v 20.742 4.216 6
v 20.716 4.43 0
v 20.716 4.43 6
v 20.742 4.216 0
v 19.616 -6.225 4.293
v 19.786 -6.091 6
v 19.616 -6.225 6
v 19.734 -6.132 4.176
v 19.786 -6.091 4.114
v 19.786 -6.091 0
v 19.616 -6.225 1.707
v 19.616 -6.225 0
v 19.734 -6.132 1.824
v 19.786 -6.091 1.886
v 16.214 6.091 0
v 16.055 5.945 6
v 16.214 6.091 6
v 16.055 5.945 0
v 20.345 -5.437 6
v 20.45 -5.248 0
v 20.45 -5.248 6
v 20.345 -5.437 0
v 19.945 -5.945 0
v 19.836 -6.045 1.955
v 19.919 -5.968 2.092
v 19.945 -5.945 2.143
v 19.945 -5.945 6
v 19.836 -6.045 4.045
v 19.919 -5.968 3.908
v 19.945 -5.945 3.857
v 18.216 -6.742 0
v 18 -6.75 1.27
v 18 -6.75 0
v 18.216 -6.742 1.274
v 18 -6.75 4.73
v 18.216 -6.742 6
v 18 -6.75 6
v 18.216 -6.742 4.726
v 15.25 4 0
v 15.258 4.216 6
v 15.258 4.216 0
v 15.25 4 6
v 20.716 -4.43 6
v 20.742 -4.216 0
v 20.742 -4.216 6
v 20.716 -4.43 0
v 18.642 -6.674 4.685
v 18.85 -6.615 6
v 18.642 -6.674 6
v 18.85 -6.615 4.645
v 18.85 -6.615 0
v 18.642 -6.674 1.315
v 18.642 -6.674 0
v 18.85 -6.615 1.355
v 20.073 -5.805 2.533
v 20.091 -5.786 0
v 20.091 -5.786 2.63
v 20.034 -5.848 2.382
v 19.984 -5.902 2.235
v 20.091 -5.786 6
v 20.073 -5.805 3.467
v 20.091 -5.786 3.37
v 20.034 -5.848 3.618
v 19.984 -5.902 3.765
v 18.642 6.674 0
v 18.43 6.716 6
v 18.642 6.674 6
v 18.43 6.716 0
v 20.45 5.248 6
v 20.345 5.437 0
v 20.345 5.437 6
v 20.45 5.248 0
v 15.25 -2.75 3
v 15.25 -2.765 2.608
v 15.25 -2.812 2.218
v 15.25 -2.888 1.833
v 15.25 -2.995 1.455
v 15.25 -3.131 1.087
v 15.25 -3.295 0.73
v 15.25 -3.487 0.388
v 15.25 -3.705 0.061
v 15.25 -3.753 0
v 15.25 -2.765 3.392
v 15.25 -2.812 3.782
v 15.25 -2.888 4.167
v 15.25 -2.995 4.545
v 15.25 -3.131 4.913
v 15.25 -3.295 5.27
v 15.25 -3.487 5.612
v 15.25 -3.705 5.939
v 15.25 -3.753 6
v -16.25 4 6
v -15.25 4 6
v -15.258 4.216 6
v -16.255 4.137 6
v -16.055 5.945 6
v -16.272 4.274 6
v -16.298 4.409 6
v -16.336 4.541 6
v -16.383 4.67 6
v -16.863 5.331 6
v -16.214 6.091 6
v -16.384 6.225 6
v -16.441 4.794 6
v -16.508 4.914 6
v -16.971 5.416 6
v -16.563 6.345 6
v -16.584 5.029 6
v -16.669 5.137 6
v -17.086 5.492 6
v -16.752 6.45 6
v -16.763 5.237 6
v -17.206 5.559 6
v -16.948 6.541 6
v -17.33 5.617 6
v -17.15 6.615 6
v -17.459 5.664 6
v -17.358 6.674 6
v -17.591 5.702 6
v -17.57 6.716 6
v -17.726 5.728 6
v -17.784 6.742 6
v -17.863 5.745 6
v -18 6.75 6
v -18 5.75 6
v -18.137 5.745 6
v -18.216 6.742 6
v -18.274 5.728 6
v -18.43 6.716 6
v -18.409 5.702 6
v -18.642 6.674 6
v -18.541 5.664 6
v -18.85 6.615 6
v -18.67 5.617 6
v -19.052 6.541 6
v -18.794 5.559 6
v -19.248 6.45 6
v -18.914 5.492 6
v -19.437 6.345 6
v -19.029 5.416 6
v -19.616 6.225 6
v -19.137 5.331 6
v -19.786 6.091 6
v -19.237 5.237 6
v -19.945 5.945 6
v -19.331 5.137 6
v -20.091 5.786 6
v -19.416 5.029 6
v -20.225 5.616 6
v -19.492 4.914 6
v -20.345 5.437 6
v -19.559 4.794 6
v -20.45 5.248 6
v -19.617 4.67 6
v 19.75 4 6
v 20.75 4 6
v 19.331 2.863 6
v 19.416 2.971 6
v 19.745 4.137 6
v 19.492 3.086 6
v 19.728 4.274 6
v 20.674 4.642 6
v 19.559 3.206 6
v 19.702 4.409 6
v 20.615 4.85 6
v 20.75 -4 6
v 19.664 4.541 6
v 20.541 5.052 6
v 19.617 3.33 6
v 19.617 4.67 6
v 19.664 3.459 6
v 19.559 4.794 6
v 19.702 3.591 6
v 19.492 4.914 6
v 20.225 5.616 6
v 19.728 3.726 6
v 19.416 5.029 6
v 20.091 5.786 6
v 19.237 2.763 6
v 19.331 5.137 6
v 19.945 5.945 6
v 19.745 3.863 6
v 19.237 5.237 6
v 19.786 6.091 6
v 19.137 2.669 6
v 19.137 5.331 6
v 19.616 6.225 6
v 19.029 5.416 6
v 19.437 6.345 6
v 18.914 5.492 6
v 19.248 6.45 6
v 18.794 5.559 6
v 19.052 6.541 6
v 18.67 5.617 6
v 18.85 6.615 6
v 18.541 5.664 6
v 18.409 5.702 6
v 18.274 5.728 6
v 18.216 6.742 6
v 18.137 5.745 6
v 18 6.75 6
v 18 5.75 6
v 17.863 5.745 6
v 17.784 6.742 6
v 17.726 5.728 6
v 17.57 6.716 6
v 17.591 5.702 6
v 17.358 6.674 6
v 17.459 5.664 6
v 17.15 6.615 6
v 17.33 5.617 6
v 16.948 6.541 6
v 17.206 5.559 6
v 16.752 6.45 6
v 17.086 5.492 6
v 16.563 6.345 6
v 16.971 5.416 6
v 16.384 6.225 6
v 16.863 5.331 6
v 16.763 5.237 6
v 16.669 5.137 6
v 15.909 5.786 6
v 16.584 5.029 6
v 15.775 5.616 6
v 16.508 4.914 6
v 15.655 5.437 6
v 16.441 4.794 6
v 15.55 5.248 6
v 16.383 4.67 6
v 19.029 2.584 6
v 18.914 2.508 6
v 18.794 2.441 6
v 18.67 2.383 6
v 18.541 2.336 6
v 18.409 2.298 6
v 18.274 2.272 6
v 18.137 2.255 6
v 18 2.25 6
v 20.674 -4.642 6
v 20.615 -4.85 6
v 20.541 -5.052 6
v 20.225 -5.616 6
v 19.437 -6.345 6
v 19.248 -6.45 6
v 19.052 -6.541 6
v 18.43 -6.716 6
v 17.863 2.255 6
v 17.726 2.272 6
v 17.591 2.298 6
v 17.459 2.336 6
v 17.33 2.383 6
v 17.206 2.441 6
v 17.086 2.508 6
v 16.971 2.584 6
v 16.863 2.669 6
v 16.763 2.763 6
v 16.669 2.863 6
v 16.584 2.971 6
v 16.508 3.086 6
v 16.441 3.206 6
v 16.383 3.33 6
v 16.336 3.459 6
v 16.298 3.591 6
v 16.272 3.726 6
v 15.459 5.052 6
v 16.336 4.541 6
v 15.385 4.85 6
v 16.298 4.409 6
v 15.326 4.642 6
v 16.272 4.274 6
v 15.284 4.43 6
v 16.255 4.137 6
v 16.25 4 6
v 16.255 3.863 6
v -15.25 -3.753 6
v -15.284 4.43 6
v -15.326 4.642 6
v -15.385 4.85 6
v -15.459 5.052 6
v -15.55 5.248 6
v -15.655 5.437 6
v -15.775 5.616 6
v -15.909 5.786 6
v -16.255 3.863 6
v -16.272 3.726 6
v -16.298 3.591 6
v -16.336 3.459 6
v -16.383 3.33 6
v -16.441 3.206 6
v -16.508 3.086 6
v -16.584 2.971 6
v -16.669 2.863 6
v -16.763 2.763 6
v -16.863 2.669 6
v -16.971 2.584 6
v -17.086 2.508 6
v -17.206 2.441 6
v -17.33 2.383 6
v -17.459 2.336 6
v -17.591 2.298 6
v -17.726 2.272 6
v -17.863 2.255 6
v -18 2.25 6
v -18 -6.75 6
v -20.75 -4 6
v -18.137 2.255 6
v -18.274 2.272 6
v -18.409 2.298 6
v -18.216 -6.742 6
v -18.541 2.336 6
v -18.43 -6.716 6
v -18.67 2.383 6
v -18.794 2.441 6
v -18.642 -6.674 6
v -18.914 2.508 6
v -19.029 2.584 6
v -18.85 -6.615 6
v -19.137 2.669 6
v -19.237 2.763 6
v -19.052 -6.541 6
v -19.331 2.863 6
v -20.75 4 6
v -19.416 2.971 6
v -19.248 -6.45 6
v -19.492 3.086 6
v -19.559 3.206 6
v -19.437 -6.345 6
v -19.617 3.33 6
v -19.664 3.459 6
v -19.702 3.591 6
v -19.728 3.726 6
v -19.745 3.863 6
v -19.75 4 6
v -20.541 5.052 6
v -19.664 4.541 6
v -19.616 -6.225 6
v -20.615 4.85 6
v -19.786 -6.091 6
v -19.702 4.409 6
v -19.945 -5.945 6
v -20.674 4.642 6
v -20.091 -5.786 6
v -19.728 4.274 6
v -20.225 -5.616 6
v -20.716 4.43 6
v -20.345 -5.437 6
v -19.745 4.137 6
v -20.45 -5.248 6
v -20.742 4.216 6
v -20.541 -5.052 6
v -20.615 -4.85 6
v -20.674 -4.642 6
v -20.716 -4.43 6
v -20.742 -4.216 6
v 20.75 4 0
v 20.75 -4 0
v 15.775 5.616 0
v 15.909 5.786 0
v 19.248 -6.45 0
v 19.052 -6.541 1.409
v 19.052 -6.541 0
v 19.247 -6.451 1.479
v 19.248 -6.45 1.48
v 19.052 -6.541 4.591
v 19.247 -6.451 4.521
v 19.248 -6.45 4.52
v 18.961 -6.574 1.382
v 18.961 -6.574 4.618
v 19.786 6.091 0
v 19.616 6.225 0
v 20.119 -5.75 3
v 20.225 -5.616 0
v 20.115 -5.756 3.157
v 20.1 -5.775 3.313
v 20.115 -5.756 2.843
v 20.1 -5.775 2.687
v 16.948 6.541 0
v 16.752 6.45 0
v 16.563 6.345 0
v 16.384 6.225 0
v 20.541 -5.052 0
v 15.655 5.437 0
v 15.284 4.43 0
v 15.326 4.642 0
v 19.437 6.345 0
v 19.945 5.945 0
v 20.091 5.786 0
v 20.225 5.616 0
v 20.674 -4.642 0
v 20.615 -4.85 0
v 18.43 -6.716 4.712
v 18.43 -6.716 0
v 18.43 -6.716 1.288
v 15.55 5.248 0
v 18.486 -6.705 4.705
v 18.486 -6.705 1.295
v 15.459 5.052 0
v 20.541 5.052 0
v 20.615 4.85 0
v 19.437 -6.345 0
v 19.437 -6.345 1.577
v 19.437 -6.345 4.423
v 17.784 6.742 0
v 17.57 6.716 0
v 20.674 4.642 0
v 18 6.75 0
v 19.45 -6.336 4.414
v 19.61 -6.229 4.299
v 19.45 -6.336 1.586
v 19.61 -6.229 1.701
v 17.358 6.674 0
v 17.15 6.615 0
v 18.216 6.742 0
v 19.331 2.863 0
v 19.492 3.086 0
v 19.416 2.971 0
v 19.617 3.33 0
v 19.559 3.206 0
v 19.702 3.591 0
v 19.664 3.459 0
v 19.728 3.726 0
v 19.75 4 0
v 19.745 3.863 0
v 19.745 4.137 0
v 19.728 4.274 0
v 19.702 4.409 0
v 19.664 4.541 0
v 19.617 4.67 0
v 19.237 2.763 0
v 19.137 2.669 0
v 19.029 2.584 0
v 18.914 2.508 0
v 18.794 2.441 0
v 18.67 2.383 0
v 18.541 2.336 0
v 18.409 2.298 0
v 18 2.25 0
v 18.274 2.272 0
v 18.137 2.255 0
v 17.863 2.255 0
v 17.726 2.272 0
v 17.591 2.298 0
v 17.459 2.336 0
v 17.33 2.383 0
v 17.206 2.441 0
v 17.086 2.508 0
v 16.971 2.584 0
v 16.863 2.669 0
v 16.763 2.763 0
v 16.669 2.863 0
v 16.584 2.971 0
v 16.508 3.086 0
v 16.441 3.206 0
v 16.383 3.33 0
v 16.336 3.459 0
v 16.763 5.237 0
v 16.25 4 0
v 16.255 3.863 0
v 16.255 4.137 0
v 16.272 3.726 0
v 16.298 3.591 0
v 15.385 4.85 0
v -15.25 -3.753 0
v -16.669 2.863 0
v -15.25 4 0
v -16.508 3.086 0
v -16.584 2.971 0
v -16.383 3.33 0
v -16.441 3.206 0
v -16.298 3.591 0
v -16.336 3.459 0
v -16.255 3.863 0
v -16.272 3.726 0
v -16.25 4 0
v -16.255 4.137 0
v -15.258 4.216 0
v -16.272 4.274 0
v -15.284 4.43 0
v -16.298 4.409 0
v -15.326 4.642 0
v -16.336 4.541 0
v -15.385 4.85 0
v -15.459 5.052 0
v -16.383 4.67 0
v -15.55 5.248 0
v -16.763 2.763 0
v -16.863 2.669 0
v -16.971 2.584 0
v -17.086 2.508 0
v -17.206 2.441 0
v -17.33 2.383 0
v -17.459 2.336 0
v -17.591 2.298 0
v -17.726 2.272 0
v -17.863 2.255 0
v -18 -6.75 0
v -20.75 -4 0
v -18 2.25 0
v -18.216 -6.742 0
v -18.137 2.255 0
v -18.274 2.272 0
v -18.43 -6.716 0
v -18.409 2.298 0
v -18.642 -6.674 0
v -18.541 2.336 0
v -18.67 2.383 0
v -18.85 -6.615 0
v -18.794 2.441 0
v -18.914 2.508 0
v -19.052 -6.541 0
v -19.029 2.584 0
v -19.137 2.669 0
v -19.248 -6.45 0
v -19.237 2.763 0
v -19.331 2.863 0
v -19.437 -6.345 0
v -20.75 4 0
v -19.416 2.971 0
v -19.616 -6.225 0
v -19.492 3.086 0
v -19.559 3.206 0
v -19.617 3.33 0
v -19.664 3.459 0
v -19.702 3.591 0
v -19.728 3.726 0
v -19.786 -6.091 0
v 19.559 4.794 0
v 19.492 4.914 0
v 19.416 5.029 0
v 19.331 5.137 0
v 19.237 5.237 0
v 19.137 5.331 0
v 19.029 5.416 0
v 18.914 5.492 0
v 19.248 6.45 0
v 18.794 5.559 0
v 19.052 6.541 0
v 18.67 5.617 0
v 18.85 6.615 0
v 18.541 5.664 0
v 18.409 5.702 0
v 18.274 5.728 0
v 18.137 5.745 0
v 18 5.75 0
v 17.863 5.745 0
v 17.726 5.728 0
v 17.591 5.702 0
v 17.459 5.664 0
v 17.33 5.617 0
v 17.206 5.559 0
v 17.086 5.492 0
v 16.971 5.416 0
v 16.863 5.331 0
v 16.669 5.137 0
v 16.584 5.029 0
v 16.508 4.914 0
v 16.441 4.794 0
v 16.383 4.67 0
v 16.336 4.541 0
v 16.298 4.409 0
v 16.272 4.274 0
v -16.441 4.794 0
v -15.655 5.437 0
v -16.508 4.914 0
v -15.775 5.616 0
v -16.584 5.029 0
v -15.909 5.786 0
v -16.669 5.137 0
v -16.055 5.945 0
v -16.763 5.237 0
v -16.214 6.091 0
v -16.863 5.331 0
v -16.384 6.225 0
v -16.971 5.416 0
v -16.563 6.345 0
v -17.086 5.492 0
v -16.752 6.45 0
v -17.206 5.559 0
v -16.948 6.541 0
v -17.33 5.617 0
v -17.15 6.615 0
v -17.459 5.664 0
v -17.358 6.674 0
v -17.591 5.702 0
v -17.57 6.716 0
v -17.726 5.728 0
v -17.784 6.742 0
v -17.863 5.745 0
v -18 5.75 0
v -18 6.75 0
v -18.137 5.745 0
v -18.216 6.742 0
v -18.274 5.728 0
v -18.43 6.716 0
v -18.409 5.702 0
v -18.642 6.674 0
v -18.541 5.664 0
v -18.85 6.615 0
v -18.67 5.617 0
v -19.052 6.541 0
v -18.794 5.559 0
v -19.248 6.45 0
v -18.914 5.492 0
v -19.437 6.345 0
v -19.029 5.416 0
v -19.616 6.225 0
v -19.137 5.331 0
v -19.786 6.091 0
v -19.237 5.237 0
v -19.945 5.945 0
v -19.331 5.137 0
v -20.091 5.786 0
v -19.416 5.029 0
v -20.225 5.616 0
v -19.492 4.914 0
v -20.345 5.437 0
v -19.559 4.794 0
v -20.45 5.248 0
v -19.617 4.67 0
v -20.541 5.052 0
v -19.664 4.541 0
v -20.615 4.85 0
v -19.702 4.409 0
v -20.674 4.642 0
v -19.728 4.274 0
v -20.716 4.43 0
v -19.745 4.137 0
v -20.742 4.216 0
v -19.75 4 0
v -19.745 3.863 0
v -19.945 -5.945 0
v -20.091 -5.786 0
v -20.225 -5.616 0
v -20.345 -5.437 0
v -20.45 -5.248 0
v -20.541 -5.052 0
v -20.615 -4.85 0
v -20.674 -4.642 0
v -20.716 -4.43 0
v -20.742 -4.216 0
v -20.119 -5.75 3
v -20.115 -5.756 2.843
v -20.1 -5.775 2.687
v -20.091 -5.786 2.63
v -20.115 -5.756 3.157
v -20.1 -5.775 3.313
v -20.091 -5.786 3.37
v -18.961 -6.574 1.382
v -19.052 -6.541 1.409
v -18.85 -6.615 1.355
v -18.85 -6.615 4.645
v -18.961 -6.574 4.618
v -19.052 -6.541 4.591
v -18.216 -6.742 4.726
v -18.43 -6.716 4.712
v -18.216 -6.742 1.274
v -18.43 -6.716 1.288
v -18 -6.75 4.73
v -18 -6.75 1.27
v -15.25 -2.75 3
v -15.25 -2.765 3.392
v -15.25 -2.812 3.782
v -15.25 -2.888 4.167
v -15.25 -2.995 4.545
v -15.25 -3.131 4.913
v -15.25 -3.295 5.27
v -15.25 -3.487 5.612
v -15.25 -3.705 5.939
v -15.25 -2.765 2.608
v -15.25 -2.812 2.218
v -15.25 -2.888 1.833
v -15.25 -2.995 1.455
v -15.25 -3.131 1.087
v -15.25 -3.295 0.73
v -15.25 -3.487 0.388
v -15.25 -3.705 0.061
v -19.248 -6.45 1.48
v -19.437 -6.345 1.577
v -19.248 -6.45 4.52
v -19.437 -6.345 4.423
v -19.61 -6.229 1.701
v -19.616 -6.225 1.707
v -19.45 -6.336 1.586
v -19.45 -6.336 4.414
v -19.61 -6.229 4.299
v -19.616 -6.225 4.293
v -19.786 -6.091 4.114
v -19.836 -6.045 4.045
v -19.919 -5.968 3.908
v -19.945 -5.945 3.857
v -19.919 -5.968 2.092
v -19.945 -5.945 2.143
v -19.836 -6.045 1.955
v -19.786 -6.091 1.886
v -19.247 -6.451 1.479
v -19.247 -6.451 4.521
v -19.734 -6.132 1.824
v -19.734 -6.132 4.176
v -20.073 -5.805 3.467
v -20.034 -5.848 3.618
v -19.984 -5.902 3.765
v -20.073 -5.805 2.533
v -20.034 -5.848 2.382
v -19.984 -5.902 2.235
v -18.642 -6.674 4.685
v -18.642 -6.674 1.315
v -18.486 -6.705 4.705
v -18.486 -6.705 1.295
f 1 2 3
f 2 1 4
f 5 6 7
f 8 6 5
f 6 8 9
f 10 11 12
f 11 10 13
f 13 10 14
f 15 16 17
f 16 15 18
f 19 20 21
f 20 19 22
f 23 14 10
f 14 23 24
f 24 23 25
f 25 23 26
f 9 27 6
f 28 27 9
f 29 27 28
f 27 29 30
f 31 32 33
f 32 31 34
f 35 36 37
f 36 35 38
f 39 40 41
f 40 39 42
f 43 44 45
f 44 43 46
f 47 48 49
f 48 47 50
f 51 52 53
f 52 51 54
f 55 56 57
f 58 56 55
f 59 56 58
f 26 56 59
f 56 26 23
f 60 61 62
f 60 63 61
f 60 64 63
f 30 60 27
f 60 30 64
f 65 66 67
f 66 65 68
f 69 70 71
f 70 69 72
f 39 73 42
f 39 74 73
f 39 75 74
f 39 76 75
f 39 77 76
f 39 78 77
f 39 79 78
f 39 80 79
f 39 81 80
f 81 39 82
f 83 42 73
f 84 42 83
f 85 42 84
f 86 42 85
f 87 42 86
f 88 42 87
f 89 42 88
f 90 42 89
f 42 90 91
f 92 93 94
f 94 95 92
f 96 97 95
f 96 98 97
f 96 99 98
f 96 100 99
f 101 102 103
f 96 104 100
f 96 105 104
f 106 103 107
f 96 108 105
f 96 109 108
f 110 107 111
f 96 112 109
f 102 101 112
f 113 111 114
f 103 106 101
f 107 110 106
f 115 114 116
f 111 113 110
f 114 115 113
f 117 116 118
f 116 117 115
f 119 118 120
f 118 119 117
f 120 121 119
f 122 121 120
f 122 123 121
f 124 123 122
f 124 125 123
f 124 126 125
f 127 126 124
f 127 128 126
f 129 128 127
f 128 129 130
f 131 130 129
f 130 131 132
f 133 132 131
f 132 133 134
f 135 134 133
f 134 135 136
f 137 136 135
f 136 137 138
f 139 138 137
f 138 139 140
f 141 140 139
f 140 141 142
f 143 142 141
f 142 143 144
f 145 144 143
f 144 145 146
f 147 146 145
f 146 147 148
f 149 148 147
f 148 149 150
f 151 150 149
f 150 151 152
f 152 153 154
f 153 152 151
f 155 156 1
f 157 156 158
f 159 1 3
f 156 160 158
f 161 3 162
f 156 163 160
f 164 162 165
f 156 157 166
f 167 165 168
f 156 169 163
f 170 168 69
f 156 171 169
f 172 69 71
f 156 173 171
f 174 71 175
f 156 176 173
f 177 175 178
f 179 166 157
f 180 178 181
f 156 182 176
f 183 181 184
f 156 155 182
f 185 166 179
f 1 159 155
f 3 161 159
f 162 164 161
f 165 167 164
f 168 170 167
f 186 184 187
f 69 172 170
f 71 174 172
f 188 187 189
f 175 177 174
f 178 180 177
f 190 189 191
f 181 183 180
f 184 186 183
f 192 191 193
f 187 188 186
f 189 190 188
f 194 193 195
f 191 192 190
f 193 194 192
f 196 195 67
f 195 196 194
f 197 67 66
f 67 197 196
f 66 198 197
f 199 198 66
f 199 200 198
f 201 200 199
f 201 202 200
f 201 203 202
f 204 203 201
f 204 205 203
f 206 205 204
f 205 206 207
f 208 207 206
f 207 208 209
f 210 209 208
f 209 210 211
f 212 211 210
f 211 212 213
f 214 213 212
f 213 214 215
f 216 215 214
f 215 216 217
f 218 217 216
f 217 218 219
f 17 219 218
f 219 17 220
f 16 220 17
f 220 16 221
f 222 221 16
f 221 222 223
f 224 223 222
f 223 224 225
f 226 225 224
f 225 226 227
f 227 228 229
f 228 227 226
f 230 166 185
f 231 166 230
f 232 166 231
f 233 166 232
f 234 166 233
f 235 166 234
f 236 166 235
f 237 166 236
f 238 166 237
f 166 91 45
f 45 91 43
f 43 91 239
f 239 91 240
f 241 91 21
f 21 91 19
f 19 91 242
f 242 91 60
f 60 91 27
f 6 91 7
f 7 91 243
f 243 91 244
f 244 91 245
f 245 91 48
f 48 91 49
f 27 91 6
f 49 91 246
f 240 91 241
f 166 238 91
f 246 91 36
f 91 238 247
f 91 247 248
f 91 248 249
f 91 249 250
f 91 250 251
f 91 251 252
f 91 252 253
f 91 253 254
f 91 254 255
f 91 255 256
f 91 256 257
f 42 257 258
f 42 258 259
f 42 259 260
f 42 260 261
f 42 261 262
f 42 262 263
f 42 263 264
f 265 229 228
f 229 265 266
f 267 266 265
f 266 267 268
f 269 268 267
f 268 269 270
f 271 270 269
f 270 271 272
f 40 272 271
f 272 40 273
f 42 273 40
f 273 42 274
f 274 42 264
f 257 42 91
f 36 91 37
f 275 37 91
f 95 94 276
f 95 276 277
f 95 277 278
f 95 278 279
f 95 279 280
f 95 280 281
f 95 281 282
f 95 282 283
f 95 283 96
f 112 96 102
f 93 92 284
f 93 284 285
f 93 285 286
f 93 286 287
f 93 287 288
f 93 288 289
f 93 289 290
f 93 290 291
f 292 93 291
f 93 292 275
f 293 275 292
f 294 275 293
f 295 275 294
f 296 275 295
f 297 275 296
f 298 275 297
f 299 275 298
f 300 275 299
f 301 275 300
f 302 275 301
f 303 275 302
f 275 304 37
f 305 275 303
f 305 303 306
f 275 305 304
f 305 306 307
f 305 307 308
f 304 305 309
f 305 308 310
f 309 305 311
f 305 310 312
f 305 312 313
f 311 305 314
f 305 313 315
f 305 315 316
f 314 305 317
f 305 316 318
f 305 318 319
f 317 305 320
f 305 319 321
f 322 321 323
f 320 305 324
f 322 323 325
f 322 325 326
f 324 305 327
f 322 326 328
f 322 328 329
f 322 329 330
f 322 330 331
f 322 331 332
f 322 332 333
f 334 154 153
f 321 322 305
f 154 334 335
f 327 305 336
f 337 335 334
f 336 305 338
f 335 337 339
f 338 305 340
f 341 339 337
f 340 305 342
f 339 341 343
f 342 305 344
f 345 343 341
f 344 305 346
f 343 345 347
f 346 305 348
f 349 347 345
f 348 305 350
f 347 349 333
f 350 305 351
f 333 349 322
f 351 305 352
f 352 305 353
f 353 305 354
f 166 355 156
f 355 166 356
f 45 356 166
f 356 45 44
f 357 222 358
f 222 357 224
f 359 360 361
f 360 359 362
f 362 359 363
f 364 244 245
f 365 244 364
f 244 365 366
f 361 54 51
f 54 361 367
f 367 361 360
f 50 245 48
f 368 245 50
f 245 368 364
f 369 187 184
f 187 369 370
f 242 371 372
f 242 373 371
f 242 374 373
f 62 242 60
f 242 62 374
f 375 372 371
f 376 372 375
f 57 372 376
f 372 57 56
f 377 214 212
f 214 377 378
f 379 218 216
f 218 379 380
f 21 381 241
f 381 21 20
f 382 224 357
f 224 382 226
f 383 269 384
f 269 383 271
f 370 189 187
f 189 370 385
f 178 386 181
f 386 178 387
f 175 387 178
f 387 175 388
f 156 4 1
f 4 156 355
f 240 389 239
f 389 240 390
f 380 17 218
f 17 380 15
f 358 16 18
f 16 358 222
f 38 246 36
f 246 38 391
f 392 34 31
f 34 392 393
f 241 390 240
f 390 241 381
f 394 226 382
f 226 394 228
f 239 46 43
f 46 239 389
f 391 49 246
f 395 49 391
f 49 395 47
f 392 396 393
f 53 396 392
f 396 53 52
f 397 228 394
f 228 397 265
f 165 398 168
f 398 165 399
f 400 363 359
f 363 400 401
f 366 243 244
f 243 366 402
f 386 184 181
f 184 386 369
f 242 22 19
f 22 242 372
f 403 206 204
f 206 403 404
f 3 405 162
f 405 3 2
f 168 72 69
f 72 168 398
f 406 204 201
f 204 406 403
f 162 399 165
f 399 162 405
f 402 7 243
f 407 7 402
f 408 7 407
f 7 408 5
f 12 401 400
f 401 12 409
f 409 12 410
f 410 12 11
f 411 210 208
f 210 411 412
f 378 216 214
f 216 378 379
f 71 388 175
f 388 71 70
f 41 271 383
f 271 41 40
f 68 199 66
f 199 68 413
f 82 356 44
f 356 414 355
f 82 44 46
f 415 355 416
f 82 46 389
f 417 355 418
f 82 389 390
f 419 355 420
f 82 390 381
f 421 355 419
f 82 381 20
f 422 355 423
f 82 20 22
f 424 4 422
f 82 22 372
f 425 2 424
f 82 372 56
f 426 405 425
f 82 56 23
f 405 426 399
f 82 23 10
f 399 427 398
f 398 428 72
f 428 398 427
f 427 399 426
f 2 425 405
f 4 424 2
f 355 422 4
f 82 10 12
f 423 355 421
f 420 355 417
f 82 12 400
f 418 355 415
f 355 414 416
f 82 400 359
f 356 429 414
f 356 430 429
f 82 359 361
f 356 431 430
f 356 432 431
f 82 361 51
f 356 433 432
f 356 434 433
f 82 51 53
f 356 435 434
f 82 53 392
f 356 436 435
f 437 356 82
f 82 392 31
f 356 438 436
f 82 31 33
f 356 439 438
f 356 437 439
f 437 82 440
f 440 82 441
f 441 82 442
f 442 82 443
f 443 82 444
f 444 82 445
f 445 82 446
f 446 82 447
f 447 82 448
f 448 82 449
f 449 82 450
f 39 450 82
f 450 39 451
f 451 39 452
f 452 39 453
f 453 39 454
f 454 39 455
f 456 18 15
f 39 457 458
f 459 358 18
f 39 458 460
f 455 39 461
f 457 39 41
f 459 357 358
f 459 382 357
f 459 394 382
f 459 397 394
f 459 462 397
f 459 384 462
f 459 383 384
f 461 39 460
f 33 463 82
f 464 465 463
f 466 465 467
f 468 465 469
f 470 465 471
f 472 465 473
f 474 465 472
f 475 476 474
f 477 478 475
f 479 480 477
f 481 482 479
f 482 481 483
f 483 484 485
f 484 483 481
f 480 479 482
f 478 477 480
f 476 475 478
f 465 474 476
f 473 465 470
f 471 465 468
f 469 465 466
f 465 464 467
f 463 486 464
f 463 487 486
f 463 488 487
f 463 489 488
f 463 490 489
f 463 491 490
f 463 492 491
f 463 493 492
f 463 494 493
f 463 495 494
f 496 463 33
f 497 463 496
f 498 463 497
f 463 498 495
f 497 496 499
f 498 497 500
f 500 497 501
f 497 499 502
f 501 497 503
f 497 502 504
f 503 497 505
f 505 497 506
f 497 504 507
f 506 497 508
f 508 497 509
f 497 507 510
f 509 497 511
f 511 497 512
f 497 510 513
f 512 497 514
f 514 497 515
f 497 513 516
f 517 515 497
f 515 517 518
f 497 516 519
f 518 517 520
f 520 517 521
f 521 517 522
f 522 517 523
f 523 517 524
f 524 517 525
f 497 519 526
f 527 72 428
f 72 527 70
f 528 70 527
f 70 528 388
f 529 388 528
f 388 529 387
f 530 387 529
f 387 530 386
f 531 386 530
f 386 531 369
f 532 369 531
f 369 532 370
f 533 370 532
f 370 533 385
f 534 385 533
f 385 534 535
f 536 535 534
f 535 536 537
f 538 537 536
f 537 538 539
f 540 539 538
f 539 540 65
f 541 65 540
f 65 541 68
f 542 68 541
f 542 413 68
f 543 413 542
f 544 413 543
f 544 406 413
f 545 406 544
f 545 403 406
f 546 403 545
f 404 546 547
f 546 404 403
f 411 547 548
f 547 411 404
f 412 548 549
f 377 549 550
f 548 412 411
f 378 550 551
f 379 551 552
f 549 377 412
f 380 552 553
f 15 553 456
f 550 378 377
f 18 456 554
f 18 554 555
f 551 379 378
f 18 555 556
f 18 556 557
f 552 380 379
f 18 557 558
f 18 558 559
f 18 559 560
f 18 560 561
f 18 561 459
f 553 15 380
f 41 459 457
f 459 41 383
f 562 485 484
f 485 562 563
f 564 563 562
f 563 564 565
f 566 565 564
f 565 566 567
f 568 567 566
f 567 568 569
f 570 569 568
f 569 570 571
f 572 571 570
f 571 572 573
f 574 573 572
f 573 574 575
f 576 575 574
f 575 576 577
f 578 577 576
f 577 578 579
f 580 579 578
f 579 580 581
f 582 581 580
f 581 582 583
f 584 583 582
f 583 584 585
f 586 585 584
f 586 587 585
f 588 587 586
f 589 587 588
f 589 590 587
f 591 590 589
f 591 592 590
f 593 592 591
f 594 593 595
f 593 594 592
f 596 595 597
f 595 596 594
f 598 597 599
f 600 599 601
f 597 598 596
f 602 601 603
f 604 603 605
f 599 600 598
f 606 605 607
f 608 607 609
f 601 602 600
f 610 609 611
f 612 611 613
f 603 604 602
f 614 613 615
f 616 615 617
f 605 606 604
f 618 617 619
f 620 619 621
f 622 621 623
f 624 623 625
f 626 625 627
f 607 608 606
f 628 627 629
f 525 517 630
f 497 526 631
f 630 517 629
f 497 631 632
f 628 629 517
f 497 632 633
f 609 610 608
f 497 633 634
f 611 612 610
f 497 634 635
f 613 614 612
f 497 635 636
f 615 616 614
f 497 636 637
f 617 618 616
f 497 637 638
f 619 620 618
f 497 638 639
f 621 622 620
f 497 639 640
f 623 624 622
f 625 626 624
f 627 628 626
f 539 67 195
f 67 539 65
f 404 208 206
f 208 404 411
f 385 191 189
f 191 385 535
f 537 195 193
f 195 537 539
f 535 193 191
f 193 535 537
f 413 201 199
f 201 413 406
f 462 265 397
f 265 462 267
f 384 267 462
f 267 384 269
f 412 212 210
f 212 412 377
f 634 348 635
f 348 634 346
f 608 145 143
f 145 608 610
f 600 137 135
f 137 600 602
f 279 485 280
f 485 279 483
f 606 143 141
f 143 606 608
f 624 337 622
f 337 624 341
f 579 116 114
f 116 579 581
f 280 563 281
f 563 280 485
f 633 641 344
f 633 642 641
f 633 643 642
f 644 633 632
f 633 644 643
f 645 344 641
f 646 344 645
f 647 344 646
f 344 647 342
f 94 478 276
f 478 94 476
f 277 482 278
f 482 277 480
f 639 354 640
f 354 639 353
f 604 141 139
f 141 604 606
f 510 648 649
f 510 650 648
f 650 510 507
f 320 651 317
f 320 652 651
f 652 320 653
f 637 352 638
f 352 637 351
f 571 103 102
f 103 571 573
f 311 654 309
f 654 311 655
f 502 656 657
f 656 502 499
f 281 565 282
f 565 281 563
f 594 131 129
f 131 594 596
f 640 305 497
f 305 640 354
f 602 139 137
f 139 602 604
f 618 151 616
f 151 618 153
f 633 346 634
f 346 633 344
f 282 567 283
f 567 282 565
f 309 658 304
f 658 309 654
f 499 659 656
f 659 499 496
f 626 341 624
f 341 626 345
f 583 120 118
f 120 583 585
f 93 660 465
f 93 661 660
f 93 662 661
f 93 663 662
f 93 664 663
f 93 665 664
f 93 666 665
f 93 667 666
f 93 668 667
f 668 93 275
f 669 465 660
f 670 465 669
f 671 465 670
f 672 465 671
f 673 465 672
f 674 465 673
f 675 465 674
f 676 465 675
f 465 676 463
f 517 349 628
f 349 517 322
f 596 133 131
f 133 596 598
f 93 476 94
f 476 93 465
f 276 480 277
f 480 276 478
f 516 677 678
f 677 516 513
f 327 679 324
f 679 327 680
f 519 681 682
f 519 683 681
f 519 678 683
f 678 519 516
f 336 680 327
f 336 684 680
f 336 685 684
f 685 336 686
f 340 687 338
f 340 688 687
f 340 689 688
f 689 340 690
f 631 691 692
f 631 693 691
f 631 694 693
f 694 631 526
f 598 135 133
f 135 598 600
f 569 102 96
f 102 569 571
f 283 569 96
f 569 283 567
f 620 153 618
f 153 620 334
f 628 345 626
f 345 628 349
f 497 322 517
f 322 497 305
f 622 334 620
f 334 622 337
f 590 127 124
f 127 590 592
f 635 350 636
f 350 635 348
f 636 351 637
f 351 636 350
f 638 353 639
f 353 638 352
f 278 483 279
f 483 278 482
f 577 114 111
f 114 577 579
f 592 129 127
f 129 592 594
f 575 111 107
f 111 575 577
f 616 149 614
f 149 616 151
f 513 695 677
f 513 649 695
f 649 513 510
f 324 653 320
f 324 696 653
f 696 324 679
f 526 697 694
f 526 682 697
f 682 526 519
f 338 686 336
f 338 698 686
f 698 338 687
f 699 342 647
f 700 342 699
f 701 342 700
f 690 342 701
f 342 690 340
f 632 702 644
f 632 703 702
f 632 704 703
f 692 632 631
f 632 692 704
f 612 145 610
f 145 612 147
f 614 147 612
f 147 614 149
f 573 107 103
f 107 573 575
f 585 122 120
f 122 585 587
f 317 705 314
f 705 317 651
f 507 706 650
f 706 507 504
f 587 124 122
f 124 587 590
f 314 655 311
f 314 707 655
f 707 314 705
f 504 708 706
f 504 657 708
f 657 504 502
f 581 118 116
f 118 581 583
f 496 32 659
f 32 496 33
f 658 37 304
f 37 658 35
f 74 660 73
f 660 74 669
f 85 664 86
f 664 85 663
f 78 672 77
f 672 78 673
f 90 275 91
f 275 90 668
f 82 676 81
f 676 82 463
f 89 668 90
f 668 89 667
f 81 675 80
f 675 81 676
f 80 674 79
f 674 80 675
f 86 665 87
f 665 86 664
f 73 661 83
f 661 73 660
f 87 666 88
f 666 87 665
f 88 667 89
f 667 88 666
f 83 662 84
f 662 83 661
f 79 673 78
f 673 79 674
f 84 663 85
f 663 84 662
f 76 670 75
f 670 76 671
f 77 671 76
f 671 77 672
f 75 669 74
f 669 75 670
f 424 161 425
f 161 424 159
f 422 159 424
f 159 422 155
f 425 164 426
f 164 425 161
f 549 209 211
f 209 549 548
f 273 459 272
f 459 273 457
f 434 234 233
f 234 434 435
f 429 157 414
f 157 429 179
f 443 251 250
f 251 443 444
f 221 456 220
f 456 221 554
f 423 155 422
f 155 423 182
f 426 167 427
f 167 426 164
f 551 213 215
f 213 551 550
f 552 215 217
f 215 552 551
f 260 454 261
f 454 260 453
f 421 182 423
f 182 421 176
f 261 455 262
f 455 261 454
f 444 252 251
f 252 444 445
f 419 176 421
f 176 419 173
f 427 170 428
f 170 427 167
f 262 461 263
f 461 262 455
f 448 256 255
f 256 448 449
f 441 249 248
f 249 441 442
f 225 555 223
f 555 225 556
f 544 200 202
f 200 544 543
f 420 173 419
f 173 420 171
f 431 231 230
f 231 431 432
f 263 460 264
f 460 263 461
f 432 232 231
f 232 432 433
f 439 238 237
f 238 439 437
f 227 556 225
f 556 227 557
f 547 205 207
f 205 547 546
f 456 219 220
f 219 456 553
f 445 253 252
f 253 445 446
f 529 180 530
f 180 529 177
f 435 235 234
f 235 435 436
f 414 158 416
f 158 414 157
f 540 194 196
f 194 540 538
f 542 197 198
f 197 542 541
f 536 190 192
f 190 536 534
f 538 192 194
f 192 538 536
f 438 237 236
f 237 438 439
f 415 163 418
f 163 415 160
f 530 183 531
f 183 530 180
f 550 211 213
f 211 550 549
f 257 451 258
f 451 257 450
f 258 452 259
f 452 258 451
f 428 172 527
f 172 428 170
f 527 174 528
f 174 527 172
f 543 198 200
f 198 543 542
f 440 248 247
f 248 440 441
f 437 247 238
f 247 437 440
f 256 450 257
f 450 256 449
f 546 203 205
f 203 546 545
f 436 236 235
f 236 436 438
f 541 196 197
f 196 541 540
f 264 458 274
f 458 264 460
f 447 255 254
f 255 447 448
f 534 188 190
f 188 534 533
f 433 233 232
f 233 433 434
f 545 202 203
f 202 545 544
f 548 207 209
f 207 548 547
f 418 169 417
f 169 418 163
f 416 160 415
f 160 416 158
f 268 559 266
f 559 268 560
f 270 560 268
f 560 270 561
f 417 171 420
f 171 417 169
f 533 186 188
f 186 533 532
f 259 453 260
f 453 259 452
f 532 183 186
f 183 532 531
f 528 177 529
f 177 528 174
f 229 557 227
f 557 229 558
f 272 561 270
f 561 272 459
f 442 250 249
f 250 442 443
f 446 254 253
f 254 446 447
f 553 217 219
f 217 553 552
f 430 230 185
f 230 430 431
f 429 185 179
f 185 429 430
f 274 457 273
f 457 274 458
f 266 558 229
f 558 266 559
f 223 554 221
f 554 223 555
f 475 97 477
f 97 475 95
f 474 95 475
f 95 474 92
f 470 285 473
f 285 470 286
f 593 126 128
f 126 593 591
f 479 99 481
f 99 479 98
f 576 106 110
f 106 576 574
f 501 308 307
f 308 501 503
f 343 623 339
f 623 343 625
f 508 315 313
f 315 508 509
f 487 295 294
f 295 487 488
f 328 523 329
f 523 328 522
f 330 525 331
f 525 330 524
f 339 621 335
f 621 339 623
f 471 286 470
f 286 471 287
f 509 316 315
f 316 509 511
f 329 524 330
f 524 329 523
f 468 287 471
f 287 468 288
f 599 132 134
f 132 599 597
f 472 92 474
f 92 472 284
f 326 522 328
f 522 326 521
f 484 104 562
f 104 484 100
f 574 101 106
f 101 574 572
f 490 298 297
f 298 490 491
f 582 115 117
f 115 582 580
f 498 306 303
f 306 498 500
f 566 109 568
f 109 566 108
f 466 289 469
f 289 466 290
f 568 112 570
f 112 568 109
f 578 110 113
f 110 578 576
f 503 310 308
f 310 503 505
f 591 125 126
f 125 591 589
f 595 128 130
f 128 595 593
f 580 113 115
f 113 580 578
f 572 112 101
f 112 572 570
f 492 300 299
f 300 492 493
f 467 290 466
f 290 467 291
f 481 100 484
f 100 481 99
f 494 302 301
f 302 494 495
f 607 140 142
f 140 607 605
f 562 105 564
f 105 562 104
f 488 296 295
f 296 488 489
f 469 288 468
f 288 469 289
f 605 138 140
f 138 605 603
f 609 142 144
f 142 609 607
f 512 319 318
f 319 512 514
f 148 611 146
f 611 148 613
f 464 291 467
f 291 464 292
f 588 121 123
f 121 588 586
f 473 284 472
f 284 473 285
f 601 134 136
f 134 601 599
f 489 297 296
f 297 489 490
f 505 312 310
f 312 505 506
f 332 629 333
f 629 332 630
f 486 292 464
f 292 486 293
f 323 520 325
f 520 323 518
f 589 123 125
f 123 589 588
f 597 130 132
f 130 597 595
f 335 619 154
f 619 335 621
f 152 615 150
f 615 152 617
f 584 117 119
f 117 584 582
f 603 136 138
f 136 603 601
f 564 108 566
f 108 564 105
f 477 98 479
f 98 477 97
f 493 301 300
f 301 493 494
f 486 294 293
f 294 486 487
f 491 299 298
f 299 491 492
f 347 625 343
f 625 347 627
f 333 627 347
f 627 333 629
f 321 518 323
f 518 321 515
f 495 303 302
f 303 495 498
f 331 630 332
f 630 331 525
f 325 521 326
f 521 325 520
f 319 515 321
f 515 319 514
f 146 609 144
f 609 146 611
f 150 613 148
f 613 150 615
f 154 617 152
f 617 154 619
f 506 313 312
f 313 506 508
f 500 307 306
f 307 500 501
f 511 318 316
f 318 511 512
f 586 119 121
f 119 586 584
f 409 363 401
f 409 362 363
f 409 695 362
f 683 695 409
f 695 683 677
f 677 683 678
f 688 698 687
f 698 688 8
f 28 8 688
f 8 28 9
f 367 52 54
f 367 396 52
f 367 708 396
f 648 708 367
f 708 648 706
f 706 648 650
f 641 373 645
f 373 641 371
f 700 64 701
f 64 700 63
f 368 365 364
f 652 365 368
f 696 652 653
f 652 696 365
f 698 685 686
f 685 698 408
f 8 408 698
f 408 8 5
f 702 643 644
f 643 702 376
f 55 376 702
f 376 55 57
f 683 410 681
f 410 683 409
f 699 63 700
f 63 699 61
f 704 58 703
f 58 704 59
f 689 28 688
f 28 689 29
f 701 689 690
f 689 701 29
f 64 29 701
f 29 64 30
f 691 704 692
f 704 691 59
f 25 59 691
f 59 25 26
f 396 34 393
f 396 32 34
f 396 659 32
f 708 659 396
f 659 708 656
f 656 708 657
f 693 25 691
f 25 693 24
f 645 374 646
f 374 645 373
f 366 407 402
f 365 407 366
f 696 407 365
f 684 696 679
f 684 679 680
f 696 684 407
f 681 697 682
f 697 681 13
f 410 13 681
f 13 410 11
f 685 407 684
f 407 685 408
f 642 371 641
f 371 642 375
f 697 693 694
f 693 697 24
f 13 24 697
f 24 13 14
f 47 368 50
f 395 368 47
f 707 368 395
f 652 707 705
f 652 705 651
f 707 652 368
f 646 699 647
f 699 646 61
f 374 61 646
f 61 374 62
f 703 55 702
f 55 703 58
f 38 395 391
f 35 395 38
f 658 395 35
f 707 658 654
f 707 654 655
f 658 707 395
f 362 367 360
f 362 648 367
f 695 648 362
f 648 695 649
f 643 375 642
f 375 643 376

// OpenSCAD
// file: inc/42BYG48HJ50.scad
// Author: EiNSTeiN_ <einstein@g3nius.org>

module motor_42BYG48HJ50(mini_hyena=false) {

	cylinder(h=38,r=42/2);

	difference() {
		translate([-22,-22,0]) cube([44,44,1.2]);
		for(r=[0,90,180,270])
			rotate([0,0,r]) translate([-36/2,-36/2, 0]) cylinder(h=1.2,r=3.4/2);
	}

	translate([0,(-44/2)+11.5,-14]) cylinder(r=5/2,h=14);


	// mini hyena: H=10mm, ID=5mm, OD=12.5mm
	if(mini_hyena) translate([0,(-44/2)+11.5,-3]) rotate([180,0,0]) difference() {
		union() {
			cylinder(h=5.5,r=12.5/2);
			translate([0,0,5.5]) cylinder(h=2,r2=10.5/2, r1=12.5/2);
			translate([0,0,5.5+2]) cylinder(h=2, r2=12.5/2,r1=10.5/2);
			translate([0,0,9.5]) cylinder(h=0.5,r=12.5/2);
		}
		cylinder(h=10,r=5/2);
	}
}

motor_42BYG48HJ50(mini_hyena=true);
// main file
use <inc/42BYG48HJ50.scad>;

$fn=80;

motor_width = 44;
motor_hole_spacing = 36;
motor_hole_dia = 3.5;
wall = 1;
thickness = 6;

module motor_cable_clip()
{
  y = (motor_width/2)-(motor_hole_spacing/2);
  difference() {
    union() {
      for(x=[1,-1]) hull()
        for(my=[1,-1])
        translate([x*motor_hole_spacing/2, my*y, 0]) 
        cylinder(r=(motor_hole_dia/2)+wall, h=thickness);
      
      intersection() {
        hull()
        for(x=[1,-1])
        translate([x*motor_hole_spacing/2, -y, 0])
          cylinder(r=(motor_hole_dia/2)+wall, h=thickness);
        
        translate([0, -y-(motor_hole_dia/2)-wall-1, thickness/2])
          rotate([0, 90, 0])
          translate([0, 0, -motor_width/2])
          cylinder(r=10/2, h=motor_width);
      }
    }
    union() {
      translate([0, -y-(motor_hole_dia/2)-wall-1, thickness/2])
        rotate([0, 90, 0])
        translate([0, 0, -motor_width/2])
        cylinder(r=4/2, h=motor_width);
      
      for(x=[1,-1])
        translate([x*motor_hole_spacing/2, y, 0]) 
        cylinder(r=(motor_hole_dia/2), h=thickness);
    }
  }
}

%translate([0, motor_width/2, 0])
  rotate([180, 0, 0]) 
  motor_42BYG48HJ50();
motor_cable_clip();
